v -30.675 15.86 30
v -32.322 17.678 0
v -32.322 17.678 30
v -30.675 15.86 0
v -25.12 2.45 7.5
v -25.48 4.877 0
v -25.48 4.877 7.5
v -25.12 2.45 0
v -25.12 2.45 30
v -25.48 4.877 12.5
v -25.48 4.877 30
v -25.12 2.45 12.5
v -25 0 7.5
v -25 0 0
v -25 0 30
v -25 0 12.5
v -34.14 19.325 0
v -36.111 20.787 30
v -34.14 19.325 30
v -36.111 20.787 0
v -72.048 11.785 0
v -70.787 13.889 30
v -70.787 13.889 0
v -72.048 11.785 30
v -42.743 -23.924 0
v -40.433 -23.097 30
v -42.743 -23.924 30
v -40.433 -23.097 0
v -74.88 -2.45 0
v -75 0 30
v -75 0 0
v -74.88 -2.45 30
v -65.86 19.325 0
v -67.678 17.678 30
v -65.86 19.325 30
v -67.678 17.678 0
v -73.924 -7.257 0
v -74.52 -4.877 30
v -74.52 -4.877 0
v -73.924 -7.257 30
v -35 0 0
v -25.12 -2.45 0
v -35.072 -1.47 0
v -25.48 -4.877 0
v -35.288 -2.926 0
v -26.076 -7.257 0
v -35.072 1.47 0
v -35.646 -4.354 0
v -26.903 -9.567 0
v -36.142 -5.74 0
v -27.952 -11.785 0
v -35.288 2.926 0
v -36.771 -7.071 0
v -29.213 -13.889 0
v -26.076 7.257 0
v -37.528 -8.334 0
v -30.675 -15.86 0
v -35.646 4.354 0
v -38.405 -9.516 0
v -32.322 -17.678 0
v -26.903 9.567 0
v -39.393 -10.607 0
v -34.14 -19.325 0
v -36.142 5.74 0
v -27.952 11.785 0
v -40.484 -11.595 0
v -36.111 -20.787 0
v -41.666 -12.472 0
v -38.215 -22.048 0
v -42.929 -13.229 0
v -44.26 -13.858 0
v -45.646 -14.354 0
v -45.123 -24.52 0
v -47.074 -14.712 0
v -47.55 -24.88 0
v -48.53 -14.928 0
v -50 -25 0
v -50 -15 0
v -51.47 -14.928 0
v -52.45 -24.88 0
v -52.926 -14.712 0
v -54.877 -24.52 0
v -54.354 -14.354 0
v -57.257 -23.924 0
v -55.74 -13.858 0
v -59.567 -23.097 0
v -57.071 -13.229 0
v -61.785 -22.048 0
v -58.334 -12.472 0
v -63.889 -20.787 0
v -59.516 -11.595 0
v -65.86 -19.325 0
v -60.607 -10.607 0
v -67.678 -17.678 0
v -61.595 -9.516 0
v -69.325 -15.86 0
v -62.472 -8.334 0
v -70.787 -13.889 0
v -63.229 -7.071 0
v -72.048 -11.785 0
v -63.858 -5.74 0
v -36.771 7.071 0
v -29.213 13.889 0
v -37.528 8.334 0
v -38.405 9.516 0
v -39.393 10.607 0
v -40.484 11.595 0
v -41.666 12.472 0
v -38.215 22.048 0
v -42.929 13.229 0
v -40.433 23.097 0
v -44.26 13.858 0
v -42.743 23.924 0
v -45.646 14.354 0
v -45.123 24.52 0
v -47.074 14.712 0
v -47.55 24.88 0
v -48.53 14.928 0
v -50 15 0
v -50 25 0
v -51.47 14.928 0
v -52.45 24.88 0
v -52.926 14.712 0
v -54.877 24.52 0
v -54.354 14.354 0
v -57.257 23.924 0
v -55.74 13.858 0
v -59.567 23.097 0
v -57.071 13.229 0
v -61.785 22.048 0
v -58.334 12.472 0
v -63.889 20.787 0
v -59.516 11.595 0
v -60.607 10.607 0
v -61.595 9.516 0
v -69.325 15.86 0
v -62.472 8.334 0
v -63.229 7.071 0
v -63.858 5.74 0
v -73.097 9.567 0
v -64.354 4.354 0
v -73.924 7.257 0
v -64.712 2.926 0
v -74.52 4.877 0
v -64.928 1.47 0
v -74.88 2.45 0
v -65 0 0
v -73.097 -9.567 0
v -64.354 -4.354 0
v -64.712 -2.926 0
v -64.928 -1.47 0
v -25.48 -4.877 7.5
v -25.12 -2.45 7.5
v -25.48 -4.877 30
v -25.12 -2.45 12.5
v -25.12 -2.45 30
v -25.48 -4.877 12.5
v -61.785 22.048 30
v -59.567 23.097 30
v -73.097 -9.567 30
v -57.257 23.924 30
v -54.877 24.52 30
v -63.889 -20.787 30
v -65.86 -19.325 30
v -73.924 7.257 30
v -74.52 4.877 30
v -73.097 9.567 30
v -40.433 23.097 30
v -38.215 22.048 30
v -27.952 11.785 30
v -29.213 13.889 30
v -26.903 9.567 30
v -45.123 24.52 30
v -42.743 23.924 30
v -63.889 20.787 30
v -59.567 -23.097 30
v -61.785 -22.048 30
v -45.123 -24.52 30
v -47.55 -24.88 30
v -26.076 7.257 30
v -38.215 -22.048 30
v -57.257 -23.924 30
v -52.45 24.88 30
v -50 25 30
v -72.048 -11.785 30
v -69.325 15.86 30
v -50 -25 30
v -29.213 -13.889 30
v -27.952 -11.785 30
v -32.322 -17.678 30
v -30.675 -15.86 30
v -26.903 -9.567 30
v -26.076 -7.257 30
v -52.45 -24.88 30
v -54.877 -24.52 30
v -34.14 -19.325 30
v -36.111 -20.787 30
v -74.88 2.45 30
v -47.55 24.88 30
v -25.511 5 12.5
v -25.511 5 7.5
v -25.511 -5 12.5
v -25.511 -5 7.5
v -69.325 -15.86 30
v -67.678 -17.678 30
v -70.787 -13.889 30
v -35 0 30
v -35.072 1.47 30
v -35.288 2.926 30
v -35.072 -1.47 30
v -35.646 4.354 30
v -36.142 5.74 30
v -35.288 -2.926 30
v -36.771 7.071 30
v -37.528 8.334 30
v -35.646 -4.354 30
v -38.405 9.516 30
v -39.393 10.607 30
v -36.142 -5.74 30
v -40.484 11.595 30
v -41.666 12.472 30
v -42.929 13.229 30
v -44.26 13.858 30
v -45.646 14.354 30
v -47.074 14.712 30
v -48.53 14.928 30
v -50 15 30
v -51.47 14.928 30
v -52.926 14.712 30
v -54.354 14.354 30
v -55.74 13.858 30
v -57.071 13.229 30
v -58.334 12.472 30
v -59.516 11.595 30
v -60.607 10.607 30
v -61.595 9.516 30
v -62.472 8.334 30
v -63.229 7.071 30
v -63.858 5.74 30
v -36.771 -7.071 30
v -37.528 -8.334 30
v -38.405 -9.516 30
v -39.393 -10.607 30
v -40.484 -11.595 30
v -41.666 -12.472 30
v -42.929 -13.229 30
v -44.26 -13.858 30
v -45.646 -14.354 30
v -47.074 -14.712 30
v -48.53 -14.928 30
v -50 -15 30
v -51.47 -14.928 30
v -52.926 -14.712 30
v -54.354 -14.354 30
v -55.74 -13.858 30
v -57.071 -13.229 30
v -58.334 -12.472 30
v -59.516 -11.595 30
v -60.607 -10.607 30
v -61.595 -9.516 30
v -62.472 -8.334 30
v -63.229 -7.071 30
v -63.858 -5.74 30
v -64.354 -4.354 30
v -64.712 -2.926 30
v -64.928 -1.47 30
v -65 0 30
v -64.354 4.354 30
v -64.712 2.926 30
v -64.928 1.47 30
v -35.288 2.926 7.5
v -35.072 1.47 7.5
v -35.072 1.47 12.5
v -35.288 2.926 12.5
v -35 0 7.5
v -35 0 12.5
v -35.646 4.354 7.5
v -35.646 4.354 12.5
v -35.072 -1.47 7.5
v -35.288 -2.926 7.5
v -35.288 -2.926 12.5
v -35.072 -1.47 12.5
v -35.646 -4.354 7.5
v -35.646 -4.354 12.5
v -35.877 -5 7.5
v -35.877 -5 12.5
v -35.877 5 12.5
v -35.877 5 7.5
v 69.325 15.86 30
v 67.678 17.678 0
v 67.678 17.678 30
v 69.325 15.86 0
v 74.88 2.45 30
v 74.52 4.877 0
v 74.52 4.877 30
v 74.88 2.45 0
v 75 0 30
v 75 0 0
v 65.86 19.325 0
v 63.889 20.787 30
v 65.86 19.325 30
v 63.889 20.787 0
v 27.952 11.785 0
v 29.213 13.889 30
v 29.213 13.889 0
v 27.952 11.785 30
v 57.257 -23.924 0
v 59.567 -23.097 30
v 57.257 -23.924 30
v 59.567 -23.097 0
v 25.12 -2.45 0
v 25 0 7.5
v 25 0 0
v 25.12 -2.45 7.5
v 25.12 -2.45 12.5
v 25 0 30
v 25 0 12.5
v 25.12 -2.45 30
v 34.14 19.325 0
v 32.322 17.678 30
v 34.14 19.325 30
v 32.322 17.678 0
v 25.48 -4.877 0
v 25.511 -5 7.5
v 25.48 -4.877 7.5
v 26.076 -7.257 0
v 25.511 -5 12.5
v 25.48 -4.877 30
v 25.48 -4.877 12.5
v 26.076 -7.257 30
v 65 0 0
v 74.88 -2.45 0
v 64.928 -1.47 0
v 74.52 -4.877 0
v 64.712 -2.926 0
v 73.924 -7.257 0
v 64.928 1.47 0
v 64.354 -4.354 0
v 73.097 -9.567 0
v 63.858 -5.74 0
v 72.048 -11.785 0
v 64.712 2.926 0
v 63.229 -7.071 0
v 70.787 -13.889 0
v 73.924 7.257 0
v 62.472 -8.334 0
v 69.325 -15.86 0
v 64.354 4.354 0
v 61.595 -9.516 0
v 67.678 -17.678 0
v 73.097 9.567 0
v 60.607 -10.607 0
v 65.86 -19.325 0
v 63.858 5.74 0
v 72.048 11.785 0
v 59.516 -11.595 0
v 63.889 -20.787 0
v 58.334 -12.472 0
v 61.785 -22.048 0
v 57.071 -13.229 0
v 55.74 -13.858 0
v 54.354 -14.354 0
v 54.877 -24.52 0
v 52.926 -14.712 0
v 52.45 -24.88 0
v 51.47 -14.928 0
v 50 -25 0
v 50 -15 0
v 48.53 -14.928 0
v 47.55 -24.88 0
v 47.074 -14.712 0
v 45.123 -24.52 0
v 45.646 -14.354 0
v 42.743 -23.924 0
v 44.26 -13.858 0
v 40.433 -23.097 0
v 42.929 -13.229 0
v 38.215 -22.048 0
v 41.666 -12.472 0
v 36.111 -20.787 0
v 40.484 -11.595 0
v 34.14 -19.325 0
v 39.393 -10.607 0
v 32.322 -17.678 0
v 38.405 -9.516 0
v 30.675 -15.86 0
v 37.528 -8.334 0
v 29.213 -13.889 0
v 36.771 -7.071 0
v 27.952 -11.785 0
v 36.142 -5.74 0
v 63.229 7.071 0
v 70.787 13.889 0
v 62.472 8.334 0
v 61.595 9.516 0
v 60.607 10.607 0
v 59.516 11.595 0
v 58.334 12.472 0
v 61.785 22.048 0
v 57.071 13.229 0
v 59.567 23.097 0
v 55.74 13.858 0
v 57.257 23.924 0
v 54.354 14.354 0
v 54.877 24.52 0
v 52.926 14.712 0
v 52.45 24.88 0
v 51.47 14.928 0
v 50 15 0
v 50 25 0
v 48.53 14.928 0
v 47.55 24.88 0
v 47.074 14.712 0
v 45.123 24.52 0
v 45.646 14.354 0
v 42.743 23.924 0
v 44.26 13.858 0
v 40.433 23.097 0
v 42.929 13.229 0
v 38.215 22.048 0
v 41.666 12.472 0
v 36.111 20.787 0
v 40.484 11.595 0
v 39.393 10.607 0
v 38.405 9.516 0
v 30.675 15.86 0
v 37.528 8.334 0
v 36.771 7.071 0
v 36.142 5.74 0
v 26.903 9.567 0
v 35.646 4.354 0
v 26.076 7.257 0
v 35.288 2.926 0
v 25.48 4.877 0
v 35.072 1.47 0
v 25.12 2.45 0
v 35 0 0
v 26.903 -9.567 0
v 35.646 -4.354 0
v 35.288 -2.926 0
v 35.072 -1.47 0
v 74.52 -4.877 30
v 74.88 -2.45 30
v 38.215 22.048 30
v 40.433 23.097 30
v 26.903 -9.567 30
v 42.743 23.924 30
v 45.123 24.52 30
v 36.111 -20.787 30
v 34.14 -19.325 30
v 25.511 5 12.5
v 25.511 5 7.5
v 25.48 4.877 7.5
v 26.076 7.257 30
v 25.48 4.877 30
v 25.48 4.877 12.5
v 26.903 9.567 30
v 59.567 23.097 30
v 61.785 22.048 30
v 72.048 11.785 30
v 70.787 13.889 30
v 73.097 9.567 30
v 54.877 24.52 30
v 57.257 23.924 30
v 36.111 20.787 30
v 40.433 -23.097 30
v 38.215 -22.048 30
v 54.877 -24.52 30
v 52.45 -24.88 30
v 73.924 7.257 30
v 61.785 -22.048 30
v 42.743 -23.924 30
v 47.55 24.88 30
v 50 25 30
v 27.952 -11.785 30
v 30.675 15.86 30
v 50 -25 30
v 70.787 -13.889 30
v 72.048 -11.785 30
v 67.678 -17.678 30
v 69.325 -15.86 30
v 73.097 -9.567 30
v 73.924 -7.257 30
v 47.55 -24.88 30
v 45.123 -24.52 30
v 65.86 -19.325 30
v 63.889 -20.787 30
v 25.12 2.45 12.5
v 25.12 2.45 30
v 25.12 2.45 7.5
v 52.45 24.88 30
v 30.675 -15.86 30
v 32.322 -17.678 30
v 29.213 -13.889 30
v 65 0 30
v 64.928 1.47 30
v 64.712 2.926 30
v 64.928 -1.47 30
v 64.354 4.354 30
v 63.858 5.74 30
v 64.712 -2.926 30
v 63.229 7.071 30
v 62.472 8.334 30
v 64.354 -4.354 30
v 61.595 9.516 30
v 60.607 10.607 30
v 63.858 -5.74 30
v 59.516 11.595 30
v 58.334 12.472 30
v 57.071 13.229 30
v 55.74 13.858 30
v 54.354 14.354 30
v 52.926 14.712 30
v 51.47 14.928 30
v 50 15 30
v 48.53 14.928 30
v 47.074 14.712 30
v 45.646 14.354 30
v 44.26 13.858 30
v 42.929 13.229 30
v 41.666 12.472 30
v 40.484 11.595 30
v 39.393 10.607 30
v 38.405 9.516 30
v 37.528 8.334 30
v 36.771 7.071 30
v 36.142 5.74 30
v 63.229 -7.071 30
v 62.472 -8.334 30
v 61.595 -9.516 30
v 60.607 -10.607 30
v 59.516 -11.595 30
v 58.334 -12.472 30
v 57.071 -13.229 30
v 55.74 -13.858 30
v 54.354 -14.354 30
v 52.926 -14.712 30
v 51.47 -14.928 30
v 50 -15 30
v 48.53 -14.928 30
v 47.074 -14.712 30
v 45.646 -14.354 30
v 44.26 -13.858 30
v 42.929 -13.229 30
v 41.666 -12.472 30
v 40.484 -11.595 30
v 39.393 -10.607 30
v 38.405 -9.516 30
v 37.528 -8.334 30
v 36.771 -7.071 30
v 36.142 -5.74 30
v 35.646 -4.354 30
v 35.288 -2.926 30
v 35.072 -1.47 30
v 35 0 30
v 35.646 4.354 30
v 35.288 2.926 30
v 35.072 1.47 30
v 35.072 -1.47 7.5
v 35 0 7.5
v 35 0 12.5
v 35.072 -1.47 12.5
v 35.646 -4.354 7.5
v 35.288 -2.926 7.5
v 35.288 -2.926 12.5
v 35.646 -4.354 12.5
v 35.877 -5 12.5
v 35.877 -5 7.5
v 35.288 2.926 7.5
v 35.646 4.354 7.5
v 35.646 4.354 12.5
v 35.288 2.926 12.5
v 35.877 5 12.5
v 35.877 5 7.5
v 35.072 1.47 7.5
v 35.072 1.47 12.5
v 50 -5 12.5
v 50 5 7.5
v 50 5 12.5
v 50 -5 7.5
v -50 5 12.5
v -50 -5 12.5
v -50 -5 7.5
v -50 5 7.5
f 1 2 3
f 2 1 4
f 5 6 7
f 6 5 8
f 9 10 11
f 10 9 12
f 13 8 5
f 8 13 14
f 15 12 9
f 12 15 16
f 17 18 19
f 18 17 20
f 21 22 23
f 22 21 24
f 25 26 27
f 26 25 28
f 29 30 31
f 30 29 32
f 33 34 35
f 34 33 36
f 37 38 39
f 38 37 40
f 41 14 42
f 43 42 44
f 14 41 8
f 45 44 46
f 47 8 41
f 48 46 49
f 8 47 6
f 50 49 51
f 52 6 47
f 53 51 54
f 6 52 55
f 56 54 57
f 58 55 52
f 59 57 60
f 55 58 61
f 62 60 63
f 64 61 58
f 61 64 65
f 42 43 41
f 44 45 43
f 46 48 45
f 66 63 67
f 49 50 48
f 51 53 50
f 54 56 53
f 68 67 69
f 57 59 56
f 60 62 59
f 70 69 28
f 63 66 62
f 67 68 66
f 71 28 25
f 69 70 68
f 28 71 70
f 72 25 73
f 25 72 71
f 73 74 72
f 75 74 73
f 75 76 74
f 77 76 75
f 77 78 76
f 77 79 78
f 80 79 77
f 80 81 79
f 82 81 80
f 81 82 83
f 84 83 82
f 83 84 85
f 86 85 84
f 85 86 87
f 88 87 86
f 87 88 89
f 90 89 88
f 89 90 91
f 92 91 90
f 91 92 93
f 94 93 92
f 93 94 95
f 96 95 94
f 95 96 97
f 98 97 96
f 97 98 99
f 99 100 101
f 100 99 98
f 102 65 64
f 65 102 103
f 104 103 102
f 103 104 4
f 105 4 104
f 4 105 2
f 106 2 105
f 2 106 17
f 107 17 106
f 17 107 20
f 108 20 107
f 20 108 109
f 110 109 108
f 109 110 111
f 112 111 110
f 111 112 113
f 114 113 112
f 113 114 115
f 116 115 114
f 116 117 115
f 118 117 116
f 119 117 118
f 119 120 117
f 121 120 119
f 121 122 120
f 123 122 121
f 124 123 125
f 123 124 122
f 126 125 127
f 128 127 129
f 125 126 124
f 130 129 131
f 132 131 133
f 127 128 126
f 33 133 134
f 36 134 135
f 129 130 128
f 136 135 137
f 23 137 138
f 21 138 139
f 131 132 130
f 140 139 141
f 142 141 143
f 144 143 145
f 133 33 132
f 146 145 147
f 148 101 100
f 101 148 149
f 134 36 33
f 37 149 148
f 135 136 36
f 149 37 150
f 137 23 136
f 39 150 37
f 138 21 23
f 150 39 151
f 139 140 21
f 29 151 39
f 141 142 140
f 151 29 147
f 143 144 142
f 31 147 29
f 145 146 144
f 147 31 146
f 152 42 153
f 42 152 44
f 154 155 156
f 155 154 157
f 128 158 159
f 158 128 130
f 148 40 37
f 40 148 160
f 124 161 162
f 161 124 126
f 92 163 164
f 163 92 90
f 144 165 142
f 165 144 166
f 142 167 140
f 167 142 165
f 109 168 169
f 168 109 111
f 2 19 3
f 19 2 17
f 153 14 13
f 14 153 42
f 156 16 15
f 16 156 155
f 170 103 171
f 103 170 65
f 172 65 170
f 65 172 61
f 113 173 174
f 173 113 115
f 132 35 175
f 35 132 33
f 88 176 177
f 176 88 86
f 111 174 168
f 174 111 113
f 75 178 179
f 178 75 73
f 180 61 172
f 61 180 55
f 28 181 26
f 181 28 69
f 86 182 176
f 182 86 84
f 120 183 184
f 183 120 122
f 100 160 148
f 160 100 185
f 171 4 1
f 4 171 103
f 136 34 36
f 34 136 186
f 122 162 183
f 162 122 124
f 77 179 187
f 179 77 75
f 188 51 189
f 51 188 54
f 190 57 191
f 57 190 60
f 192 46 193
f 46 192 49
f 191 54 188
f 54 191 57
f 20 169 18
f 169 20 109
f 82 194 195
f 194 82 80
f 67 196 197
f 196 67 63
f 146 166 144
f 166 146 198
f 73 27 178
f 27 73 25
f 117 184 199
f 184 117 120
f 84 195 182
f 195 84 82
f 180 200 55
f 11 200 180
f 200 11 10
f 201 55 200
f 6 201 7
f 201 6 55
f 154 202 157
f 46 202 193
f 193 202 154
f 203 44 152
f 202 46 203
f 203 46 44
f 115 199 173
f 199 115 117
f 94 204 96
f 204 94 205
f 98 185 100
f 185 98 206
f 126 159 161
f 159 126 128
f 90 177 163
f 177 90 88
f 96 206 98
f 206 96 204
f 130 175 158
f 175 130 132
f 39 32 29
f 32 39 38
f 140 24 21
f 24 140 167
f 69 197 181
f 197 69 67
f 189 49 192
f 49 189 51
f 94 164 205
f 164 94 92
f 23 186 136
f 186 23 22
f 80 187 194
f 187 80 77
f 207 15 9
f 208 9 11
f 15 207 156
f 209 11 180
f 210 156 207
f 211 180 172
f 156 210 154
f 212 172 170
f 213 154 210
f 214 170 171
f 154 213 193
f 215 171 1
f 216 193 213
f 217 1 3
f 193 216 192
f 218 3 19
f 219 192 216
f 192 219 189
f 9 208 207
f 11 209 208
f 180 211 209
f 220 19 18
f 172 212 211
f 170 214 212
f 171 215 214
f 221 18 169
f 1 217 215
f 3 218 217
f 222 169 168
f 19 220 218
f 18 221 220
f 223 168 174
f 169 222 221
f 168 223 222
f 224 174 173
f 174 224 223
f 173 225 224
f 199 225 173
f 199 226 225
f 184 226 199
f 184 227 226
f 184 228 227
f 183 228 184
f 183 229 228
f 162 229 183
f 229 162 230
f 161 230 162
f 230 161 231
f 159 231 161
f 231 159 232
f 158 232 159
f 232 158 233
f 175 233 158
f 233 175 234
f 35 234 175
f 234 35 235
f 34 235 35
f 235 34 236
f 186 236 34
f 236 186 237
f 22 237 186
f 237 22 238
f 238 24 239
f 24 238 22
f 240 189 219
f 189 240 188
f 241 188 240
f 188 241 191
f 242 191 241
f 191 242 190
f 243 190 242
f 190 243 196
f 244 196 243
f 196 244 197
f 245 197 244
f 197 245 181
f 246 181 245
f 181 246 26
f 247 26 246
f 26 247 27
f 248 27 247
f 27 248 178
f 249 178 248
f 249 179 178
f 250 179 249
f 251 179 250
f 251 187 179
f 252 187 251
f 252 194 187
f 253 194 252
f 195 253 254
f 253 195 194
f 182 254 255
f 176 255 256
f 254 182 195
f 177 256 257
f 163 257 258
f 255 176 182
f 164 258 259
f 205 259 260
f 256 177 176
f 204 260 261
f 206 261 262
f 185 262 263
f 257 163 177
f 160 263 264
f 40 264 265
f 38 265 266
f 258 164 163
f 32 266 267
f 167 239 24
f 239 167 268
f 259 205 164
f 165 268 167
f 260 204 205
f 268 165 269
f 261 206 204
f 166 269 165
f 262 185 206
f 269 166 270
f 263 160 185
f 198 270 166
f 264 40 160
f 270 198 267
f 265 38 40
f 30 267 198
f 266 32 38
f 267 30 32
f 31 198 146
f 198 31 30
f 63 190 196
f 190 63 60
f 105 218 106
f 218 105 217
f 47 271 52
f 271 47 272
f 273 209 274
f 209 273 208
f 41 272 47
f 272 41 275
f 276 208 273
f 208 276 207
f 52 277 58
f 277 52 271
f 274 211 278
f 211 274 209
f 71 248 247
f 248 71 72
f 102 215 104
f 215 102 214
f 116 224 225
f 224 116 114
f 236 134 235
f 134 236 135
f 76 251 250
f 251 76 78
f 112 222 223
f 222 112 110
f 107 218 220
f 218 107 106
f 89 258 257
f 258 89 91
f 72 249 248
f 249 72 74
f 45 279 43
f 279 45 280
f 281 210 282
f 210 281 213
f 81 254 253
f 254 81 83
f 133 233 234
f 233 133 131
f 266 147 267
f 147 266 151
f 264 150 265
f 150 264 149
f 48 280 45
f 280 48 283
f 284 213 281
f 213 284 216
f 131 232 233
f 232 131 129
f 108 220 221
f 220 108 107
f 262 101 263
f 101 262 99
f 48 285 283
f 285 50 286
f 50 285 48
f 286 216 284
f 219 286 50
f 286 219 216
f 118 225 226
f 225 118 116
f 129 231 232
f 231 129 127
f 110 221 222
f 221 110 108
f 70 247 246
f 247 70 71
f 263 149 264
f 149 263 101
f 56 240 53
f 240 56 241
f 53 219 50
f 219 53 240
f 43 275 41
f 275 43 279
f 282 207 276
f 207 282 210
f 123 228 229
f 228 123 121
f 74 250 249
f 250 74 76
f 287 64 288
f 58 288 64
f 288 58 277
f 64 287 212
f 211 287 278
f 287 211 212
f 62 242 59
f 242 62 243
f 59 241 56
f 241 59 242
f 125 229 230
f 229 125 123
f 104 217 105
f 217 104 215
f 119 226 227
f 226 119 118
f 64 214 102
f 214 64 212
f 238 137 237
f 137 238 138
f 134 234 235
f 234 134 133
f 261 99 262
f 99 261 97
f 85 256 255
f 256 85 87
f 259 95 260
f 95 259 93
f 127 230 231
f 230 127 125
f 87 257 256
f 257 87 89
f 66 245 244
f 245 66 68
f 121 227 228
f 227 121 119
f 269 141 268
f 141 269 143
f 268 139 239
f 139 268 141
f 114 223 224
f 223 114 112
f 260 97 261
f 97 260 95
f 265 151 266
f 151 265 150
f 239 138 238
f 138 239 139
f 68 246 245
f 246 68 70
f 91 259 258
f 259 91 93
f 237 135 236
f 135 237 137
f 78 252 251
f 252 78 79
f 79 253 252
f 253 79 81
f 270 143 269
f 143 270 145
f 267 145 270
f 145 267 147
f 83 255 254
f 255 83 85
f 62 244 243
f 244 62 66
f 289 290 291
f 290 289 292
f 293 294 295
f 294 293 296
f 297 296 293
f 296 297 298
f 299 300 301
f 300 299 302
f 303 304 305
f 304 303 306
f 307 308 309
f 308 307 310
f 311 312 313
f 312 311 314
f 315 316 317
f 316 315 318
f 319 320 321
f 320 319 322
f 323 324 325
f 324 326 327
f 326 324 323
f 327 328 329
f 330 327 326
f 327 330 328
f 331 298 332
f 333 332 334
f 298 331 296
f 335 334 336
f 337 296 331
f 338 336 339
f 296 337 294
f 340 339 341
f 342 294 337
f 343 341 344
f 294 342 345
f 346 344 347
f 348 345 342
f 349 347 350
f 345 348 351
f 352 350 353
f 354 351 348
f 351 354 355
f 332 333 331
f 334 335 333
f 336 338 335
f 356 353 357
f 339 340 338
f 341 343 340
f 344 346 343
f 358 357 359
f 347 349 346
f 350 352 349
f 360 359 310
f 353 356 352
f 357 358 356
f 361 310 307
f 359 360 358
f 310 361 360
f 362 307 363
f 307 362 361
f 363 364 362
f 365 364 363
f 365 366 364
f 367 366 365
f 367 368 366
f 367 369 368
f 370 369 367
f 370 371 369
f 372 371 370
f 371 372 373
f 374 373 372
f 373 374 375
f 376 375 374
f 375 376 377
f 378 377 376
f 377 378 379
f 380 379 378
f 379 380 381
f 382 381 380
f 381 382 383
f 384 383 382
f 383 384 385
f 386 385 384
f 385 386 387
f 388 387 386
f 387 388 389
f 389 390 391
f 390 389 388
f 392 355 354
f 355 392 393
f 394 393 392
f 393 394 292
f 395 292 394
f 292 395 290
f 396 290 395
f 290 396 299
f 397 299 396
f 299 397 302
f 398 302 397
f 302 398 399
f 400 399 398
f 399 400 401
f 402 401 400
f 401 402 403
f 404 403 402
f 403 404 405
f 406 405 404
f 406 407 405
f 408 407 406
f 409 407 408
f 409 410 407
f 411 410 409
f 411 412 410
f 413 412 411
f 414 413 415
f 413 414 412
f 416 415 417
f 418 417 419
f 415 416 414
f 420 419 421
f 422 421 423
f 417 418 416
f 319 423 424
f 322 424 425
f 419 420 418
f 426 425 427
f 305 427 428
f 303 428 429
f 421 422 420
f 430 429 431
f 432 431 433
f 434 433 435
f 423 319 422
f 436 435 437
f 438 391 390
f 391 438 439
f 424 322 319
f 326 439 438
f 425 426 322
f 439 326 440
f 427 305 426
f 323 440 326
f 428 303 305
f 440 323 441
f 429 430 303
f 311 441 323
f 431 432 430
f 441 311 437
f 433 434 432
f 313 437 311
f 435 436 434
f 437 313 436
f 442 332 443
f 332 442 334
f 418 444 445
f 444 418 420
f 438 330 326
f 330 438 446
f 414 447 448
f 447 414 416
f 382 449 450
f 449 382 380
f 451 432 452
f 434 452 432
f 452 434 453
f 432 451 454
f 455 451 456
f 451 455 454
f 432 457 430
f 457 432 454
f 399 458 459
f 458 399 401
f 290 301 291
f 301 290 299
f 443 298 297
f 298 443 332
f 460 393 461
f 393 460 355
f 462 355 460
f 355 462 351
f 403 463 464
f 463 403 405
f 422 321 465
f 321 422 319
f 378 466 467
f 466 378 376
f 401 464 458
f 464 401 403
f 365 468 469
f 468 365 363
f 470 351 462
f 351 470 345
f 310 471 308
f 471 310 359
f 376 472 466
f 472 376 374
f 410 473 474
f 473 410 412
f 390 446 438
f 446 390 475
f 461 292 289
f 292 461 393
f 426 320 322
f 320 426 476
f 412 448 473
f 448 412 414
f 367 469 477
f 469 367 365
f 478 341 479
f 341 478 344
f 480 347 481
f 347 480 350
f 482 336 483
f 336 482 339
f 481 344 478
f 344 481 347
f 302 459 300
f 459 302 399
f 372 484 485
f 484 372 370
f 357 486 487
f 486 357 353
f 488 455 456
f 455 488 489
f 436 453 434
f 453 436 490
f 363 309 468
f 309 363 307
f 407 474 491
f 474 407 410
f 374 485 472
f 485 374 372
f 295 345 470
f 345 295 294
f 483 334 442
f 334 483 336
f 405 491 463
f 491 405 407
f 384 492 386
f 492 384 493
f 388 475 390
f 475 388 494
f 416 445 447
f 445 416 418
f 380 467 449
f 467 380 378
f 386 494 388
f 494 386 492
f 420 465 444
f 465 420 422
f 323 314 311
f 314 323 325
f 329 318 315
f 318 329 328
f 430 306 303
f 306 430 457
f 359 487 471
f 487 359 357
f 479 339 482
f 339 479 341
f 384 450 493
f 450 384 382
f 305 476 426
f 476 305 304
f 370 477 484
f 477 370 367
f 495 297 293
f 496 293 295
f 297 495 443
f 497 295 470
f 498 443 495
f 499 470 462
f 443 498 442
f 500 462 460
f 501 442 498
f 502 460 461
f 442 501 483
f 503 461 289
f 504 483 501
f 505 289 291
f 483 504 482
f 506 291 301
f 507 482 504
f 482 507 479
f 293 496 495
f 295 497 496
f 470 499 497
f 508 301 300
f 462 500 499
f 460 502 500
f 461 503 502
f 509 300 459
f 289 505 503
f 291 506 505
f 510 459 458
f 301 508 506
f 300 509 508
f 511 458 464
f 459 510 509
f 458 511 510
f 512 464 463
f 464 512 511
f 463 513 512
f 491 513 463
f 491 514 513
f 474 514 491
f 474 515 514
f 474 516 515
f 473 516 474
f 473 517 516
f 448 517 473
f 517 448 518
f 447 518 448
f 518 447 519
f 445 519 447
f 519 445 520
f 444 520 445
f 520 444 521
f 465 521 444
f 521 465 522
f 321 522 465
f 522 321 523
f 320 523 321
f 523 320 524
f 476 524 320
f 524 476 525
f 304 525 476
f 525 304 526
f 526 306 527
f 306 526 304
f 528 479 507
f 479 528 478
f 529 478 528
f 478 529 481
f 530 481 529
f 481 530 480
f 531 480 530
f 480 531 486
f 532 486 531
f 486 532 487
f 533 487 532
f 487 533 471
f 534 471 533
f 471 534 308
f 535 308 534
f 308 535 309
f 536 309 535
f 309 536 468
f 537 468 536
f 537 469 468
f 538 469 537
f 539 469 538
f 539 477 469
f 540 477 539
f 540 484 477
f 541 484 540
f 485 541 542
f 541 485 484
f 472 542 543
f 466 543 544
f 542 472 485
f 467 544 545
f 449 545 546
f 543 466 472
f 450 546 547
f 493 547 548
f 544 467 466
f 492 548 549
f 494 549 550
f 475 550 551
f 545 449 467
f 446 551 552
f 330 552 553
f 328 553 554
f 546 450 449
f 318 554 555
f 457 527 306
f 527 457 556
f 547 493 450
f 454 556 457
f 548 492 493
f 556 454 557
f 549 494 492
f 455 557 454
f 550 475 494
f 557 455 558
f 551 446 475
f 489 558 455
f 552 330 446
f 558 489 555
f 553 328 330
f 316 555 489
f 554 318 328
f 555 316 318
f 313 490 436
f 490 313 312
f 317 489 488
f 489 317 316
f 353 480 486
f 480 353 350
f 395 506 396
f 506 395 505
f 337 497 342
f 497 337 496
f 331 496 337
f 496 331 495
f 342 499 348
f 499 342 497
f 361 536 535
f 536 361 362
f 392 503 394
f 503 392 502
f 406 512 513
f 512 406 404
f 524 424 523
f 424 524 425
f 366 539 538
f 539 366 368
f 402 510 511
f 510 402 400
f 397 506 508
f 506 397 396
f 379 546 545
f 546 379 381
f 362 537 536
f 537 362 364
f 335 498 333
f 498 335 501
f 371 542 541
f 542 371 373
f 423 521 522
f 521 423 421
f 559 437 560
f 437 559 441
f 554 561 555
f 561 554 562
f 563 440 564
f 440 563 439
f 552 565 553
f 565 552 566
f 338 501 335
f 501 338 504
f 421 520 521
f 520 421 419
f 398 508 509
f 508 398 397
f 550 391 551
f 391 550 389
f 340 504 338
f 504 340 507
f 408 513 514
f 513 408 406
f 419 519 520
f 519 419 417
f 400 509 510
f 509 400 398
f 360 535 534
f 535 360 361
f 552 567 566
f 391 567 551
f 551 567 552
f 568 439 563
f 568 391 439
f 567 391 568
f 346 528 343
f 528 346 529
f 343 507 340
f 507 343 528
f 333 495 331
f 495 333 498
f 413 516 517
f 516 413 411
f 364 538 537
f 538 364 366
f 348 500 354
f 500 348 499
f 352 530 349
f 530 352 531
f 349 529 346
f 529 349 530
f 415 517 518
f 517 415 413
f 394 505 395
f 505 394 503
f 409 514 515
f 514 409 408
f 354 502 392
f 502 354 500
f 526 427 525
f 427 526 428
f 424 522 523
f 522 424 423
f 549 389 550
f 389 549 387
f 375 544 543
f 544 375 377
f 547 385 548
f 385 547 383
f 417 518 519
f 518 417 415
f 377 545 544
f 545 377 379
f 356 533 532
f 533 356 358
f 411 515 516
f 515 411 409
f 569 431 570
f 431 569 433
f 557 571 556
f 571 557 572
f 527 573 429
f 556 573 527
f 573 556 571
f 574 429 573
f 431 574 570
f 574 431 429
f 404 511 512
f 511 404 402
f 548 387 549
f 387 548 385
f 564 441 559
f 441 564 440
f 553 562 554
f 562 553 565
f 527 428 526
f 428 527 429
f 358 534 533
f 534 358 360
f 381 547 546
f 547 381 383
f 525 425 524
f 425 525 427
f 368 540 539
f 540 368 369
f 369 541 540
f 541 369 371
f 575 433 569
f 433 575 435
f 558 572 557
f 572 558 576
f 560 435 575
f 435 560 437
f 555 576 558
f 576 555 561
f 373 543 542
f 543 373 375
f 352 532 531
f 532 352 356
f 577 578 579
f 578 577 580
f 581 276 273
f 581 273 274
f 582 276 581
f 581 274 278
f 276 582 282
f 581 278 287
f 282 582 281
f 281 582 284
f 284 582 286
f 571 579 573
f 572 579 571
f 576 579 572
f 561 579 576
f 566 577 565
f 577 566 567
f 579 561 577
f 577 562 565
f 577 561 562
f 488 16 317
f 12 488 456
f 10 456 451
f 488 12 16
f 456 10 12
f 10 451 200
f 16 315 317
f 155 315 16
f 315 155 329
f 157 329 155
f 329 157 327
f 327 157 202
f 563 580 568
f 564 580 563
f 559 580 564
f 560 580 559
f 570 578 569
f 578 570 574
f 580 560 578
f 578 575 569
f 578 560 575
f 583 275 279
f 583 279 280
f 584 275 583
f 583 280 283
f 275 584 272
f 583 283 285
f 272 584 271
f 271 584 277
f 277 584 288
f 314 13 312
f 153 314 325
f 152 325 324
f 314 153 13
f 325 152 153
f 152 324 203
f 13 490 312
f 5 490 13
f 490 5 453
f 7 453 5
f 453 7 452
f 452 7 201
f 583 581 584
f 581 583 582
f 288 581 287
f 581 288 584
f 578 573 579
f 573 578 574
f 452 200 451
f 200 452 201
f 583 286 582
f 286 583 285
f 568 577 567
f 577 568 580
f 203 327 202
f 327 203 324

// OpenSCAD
module u_shaped_bracket() {
    difference() {
        union() {
            // Crossbar
            translate([0, 0, 10])
            cube([100, 10, 5], center=true);

            // Side cheeks
            translate([-50, 0, 15])
            side_cheek();
            translate([50, 0, 15])
            side_cheek();
        }

        // Lightening windows in crossbar
        translate([-30, 0, 10])
        rotate([0, 0, 90])
        hex_window();
        translate([30, 0, 10])
        rotate([0, 0, 90])
        hex_window();
        translate([0, 0, 10])
        diamond_window();
    }
}

module side_cheek() {
    difference() {
        // Main circular end plate
        cylinder(h=30, r=25, center=true, $fn=64);

        // Large central circular opening
        cylinder(h=35, r=15, center=true, $fn=64);

        // Smaller cutouts
        translate([-10, 0, 0])
        cylinder(h=35, r=5, center=true, $fn=64);
        translate([10, 0, 0])
        cylinder(h=35, r=5, center=true, $fn=64);
    }
}

module hex_window() {
    polygon(points=[[0, 0], [10, 0], [15, 5], [10, 10], [0, 10], [-5, 5]]);
    linear_extrude(height=5)
    offset(r=1);
}

module diamond_window() {
    polygon(points=[[0, 0], [5, 5], [0, 10], [-5, 5]]);
    linear_extrude(height=5)
    offset(r=1);
}

u_shaped_bracket();
